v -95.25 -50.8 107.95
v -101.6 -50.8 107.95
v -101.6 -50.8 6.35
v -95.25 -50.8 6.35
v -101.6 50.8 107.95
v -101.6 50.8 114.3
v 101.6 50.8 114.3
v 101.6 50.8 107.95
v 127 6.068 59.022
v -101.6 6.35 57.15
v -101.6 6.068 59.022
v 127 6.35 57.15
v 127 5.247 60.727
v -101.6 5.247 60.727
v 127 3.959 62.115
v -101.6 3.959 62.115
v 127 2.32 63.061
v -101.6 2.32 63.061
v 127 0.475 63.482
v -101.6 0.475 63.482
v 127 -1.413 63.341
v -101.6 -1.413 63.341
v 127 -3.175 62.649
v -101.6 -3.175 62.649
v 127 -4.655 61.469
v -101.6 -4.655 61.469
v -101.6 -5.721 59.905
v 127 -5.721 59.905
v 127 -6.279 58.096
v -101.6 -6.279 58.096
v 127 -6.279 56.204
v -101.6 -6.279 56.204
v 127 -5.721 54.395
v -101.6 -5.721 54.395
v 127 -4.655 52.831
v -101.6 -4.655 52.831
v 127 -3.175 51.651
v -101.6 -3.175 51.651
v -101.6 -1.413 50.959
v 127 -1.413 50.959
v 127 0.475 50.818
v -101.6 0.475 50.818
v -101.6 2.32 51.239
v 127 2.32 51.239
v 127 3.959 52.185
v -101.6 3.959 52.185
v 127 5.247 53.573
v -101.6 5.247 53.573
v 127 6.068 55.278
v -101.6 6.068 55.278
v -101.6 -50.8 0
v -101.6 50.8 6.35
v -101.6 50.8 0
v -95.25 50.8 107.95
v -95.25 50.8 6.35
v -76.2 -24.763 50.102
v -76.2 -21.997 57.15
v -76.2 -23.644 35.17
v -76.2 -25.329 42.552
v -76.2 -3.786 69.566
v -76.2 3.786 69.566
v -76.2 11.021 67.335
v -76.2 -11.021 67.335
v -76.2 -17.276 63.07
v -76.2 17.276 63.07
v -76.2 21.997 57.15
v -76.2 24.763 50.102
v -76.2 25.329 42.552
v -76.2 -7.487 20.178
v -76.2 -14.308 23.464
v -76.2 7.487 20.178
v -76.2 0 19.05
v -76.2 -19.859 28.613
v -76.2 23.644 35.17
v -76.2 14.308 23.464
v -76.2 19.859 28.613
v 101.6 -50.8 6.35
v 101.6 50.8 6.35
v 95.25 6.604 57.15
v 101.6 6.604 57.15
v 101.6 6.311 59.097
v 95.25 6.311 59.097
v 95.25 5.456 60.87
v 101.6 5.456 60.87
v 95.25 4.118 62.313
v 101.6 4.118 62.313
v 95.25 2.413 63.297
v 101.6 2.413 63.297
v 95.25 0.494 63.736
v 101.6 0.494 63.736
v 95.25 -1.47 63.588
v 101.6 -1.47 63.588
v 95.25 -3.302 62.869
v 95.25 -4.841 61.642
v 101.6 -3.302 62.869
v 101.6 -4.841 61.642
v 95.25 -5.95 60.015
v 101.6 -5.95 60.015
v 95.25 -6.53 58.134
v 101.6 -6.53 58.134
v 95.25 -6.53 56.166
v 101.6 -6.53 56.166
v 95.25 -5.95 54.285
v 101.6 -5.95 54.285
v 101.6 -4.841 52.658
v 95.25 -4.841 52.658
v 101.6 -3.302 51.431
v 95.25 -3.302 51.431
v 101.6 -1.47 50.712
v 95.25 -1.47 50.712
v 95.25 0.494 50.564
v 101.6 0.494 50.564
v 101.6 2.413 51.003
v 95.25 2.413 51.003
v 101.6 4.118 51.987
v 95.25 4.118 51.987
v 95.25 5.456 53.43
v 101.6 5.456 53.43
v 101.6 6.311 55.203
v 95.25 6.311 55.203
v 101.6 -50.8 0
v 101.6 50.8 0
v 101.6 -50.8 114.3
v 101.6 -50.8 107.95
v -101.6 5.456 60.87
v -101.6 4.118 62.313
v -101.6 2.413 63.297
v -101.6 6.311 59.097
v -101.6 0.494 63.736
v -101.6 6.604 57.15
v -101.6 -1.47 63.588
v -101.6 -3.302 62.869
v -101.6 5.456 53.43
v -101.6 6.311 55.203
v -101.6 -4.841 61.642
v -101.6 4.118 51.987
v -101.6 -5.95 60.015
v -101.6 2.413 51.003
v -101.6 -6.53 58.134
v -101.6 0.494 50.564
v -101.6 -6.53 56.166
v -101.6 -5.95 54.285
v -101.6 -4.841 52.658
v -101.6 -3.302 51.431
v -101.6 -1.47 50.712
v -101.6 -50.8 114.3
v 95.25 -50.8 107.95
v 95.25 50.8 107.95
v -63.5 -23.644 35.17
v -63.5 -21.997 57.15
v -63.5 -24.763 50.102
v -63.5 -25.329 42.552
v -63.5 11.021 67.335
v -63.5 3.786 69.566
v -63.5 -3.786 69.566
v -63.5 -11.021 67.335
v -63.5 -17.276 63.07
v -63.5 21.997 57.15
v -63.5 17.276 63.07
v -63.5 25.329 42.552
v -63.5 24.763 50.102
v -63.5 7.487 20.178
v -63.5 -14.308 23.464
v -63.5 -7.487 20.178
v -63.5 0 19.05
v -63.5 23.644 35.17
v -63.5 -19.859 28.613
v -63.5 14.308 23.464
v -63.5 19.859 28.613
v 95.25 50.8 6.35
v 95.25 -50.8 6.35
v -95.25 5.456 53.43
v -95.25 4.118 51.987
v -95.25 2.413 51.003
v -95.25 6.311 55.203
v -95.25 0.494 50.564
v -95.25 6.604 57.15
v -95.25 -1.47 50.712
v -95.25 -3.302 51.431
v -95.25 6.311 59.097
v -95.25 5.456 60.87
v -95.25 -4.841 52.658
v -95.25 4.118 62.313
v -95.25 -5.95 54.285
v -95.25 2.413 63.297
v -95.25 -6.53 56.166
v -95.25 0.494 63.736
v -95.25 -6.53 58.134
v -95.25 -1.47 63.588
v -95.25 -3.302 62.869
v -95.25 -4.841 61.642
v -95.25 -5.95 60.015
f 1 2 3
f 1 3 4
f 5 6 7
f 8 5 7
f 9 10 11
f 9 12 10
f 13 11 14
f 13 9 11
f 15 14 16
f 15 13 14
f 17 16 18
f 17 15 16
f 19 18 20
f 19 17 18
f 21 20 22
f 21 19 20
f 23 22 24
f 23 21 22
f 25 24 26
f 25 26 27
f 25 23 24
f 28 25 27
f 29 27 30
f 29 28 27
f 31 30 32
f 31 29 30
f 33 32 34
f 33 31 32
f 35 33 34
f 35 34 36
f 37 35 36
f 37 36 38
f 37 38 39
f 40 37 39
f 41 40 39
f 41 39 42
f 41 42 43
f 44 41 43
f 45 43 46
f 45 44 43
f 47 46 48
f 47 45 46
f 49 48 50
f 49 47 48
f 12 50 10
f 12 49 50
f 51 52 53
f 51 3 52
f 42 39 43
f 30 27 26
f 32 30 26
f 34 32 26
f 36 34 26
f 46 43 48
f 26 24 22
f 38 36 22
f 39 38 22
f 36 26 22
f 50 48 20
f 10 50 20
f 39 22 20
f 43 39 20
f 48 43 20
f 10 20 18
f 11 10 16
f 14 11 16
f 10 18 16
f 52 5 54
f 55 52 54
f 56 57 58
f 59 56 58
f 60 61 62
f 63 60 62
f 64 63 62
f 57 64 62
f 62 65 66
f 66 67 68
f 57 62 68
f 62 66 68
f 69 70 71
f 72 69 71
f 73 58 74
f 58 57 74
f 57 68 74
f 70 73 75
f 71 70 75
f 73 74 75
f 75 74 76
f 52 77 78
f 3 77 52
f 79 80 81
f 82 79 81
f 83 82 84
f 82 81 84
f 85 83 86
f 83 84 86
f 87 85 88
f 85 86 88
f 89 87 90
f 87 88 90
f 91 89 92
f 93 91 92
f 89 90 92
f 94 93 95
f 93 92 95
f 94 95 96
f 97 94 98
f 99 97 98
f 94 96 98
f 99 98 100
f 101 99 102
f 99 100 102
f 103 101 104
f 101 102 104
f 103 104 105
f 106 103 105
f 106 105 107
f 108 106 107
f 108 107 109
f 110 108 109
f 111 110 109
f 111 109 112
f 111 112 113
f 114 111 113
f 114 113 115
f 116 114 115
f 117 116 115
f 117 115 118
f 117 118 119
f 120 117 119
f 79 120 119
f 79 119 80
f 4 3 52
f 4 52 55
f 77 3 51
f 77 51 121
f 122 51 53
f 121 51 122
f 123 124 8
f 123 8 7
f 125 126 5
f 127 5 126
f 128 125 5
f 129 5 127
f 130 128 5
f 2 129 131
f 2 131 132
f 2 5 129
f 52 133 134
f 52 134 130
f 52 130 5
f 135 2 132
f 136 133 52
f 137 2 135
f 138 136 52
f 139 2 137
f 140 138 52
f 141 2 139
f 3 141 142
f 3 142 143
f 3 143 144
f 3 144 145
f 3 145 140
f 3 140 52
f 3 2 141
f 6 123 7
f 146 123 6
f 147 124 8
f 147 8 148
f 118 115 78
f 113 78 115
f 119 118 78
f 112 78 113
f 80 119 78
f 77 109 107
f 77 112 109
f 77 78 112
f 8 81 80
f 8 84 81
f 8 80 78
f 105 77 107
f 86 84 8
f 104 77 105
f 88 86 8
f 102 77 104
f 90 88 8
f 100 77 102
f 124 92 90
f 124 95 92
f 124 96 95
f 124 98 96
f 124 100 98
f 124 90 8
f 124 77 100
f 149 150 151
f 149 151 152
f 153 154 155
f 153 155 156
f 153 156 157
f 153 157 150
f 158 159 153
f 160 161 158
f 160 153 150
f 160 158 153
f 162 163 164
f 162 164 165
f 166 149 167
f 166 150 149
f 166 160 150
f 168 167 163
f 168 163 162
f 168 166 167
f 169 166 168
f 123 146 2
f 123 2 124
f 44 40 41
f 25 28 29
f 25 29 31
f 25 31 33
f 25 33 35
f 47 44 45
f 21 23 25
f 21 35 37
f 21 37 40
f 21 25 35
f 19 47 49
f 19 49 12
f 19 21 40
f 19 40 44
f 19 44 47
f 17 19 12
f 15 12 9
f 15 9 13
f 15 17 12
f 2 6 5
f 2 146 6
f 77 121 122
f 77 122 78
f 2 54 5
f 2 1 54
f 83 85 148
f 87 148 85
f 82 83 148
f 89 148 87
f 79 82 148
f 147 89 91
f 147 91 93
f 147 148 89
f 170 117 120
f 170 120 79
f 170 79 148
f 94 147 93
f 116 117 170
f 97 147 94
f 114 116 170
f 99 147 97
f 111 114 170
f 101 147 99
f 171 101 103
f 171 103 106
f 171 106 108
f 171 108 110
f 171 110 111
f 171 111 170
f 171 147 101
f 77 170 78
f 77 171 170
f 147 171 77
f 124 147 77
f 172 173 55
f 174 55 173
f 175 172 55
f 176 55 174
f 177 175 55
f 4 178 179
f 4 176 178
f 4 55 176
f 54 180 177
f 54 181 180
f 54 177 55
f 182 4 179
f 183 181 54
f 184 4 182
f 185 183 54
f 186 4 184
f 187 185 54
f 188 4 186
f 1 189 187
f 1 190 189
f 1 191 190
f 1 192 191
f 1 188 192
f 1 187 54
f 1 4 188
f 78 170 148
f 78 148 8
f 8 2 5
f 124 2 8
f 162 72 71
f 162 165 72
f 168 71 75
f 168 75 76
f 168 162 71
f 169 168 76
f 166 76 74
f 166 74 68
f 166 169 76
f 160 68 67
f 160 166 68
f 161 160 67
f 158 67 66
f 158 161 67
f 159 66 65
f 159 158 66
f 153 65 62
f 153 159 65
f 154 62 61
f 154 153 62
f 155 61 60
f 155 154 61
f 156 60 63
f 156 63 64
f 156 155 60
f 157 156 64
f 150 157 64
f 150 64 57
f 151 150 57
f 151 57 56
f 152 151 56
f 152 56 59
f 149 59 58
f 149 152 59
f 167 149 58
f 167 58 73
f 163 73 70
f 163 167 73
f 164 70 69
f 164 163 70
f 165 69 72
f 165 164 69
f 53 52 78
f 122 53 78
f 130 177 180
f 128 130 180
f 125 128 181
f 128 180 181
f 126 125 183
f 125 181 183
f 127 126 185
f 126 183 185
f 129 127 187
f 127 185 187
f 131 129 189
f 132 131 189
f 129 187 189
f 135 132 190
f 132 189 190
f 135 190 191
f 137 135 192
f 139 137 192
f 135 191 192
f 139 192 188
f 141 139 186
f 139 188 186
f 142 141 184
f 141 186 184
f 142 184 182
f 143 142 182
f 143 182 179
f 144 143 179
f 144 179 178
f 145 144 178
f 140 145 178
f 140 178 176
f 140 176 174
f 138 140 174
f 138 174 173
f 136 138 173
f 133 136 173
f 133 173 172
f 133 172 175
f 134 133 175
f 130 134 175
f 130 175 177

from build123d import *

# Parameters (mm, degrees)
F1_DEPTH      = 50.8
F2_DEPTH      = 50.8
F2_DEPTH_BACK = 50.8
F3_R          = 6.604
F3_R_2        = 6.35
F4_DEPTH      = 203.201
F5_DEPTH      = 25.4
F5_DEPTH_BACK = 203.2
F0_W          = 12.7
F0_H          = 25.4


with BuildPart() as f1:
    # F0 (on Front) → F1 (new body, symmetric)
    with BuildSketch(Plane.XZ):
        Polygon((-101.6, 6.35), (-101.6, 0), (101.6, 0), (101.6, 6.35), (95.25, 6.35), (-95.25, 6.35), align=None)
    extrude(amount=F1_DEPTH, both=True)


with BuildPart() as f1b:
    # F0 (on Front) → F1, piece 2 (new body, symmetric)
    with BuildSketch(Plane.XZ):
        Polygon((-101.6, 114.3), (-101.6, 107.95), (-95.25, 107.95), (95.25, 107.95), (101.6, 107.95), (101.6, 114.3), align=None)
    extrude(amount=F1_DEPTH, both=True)


with BuildPart() as f2:
    # F0 (on Front) → F2 (new body, two sides)
    with BuildSketch(Plane.XZ) as f2_sk:
        Polygon((-101.6, 107.95), (-101.6, 6.35), (-95.25, 6.35), (-95.25, 57.15), (-95.25, 107.95), align=None)
    extrude(amount=F2_DEPTH)
    extrude(f2_sk.sketch, amount=-F2_DEPTH_BACK)


with BuildPart() as f2b:
    # F0 (on Front) → F2, piece 2 (new body, two sides)
    with BuildSketch(Plane.XZ) as f2_2_sk:
        Polygon((95.25, 6.35), (101.6, 6.35), (101.6, 107.95), (95.25, 107.95), (95.25, 57.15), align=None)
    extrude(amount=F2_DEPTH)
    extrude(f2_2_sk.sketch, amount=-F2_DEPTH_BACK)


with BuildPart() as f4_tool:
    # F3 (on face) → F4 (new body, through all)
    with BuildSketch(Plane.YZ.offset(101.6)):
        with Locations((0, 57.15)):
            Circle(F3_R)
        with Locations((0, 57.15)):
            Circle(F3_R_2, mode=Mode.SUBTRACT)
        with Locations((0, 57.15)):
            Circle(F3_R_2)
    extrude(amount=-F4_DEPTH)


with BuildPart() as f2_1:
    add(f2.part)

    # F4: cut by f4_tool
    add(f4_tool.part, mode=Mode.SUBTRACT)


with BuildPart() as f2b_1:
    add(f2b.part)

    # F4: cut by f4_tool
    add(f4_tool.part, mode=Mode.SUBTRACT)


with BuildPart() as f5:
    # F3 (on face) → F5 (new body, two sides)
    with BuildSketch(Plane.YZ.offset(101.6)) as f5_sk:
        with Locations((0, 57.15)):
            Circle(F3_R_2)
    extrude(amount=F5_DEPTH)
    extrude(f5_sk.sketch, amount=-F5_DEPTH_BACK)


with BuildPart() as f6:
    # F0 (on Front) → F6 (revolve)
    with BuildSketch(Plane.XZ):
        with Locations((-69.85, 31.75)):
            Rectangle(F0_W, F0_H)
    revolve(axis=Axis((-69.85, 0, 44.45), (1, 0, 0)))


solid = Compound([f1.part, f1b.part, f2_1.part, f2b_1.part, f5.part, f6.part])
